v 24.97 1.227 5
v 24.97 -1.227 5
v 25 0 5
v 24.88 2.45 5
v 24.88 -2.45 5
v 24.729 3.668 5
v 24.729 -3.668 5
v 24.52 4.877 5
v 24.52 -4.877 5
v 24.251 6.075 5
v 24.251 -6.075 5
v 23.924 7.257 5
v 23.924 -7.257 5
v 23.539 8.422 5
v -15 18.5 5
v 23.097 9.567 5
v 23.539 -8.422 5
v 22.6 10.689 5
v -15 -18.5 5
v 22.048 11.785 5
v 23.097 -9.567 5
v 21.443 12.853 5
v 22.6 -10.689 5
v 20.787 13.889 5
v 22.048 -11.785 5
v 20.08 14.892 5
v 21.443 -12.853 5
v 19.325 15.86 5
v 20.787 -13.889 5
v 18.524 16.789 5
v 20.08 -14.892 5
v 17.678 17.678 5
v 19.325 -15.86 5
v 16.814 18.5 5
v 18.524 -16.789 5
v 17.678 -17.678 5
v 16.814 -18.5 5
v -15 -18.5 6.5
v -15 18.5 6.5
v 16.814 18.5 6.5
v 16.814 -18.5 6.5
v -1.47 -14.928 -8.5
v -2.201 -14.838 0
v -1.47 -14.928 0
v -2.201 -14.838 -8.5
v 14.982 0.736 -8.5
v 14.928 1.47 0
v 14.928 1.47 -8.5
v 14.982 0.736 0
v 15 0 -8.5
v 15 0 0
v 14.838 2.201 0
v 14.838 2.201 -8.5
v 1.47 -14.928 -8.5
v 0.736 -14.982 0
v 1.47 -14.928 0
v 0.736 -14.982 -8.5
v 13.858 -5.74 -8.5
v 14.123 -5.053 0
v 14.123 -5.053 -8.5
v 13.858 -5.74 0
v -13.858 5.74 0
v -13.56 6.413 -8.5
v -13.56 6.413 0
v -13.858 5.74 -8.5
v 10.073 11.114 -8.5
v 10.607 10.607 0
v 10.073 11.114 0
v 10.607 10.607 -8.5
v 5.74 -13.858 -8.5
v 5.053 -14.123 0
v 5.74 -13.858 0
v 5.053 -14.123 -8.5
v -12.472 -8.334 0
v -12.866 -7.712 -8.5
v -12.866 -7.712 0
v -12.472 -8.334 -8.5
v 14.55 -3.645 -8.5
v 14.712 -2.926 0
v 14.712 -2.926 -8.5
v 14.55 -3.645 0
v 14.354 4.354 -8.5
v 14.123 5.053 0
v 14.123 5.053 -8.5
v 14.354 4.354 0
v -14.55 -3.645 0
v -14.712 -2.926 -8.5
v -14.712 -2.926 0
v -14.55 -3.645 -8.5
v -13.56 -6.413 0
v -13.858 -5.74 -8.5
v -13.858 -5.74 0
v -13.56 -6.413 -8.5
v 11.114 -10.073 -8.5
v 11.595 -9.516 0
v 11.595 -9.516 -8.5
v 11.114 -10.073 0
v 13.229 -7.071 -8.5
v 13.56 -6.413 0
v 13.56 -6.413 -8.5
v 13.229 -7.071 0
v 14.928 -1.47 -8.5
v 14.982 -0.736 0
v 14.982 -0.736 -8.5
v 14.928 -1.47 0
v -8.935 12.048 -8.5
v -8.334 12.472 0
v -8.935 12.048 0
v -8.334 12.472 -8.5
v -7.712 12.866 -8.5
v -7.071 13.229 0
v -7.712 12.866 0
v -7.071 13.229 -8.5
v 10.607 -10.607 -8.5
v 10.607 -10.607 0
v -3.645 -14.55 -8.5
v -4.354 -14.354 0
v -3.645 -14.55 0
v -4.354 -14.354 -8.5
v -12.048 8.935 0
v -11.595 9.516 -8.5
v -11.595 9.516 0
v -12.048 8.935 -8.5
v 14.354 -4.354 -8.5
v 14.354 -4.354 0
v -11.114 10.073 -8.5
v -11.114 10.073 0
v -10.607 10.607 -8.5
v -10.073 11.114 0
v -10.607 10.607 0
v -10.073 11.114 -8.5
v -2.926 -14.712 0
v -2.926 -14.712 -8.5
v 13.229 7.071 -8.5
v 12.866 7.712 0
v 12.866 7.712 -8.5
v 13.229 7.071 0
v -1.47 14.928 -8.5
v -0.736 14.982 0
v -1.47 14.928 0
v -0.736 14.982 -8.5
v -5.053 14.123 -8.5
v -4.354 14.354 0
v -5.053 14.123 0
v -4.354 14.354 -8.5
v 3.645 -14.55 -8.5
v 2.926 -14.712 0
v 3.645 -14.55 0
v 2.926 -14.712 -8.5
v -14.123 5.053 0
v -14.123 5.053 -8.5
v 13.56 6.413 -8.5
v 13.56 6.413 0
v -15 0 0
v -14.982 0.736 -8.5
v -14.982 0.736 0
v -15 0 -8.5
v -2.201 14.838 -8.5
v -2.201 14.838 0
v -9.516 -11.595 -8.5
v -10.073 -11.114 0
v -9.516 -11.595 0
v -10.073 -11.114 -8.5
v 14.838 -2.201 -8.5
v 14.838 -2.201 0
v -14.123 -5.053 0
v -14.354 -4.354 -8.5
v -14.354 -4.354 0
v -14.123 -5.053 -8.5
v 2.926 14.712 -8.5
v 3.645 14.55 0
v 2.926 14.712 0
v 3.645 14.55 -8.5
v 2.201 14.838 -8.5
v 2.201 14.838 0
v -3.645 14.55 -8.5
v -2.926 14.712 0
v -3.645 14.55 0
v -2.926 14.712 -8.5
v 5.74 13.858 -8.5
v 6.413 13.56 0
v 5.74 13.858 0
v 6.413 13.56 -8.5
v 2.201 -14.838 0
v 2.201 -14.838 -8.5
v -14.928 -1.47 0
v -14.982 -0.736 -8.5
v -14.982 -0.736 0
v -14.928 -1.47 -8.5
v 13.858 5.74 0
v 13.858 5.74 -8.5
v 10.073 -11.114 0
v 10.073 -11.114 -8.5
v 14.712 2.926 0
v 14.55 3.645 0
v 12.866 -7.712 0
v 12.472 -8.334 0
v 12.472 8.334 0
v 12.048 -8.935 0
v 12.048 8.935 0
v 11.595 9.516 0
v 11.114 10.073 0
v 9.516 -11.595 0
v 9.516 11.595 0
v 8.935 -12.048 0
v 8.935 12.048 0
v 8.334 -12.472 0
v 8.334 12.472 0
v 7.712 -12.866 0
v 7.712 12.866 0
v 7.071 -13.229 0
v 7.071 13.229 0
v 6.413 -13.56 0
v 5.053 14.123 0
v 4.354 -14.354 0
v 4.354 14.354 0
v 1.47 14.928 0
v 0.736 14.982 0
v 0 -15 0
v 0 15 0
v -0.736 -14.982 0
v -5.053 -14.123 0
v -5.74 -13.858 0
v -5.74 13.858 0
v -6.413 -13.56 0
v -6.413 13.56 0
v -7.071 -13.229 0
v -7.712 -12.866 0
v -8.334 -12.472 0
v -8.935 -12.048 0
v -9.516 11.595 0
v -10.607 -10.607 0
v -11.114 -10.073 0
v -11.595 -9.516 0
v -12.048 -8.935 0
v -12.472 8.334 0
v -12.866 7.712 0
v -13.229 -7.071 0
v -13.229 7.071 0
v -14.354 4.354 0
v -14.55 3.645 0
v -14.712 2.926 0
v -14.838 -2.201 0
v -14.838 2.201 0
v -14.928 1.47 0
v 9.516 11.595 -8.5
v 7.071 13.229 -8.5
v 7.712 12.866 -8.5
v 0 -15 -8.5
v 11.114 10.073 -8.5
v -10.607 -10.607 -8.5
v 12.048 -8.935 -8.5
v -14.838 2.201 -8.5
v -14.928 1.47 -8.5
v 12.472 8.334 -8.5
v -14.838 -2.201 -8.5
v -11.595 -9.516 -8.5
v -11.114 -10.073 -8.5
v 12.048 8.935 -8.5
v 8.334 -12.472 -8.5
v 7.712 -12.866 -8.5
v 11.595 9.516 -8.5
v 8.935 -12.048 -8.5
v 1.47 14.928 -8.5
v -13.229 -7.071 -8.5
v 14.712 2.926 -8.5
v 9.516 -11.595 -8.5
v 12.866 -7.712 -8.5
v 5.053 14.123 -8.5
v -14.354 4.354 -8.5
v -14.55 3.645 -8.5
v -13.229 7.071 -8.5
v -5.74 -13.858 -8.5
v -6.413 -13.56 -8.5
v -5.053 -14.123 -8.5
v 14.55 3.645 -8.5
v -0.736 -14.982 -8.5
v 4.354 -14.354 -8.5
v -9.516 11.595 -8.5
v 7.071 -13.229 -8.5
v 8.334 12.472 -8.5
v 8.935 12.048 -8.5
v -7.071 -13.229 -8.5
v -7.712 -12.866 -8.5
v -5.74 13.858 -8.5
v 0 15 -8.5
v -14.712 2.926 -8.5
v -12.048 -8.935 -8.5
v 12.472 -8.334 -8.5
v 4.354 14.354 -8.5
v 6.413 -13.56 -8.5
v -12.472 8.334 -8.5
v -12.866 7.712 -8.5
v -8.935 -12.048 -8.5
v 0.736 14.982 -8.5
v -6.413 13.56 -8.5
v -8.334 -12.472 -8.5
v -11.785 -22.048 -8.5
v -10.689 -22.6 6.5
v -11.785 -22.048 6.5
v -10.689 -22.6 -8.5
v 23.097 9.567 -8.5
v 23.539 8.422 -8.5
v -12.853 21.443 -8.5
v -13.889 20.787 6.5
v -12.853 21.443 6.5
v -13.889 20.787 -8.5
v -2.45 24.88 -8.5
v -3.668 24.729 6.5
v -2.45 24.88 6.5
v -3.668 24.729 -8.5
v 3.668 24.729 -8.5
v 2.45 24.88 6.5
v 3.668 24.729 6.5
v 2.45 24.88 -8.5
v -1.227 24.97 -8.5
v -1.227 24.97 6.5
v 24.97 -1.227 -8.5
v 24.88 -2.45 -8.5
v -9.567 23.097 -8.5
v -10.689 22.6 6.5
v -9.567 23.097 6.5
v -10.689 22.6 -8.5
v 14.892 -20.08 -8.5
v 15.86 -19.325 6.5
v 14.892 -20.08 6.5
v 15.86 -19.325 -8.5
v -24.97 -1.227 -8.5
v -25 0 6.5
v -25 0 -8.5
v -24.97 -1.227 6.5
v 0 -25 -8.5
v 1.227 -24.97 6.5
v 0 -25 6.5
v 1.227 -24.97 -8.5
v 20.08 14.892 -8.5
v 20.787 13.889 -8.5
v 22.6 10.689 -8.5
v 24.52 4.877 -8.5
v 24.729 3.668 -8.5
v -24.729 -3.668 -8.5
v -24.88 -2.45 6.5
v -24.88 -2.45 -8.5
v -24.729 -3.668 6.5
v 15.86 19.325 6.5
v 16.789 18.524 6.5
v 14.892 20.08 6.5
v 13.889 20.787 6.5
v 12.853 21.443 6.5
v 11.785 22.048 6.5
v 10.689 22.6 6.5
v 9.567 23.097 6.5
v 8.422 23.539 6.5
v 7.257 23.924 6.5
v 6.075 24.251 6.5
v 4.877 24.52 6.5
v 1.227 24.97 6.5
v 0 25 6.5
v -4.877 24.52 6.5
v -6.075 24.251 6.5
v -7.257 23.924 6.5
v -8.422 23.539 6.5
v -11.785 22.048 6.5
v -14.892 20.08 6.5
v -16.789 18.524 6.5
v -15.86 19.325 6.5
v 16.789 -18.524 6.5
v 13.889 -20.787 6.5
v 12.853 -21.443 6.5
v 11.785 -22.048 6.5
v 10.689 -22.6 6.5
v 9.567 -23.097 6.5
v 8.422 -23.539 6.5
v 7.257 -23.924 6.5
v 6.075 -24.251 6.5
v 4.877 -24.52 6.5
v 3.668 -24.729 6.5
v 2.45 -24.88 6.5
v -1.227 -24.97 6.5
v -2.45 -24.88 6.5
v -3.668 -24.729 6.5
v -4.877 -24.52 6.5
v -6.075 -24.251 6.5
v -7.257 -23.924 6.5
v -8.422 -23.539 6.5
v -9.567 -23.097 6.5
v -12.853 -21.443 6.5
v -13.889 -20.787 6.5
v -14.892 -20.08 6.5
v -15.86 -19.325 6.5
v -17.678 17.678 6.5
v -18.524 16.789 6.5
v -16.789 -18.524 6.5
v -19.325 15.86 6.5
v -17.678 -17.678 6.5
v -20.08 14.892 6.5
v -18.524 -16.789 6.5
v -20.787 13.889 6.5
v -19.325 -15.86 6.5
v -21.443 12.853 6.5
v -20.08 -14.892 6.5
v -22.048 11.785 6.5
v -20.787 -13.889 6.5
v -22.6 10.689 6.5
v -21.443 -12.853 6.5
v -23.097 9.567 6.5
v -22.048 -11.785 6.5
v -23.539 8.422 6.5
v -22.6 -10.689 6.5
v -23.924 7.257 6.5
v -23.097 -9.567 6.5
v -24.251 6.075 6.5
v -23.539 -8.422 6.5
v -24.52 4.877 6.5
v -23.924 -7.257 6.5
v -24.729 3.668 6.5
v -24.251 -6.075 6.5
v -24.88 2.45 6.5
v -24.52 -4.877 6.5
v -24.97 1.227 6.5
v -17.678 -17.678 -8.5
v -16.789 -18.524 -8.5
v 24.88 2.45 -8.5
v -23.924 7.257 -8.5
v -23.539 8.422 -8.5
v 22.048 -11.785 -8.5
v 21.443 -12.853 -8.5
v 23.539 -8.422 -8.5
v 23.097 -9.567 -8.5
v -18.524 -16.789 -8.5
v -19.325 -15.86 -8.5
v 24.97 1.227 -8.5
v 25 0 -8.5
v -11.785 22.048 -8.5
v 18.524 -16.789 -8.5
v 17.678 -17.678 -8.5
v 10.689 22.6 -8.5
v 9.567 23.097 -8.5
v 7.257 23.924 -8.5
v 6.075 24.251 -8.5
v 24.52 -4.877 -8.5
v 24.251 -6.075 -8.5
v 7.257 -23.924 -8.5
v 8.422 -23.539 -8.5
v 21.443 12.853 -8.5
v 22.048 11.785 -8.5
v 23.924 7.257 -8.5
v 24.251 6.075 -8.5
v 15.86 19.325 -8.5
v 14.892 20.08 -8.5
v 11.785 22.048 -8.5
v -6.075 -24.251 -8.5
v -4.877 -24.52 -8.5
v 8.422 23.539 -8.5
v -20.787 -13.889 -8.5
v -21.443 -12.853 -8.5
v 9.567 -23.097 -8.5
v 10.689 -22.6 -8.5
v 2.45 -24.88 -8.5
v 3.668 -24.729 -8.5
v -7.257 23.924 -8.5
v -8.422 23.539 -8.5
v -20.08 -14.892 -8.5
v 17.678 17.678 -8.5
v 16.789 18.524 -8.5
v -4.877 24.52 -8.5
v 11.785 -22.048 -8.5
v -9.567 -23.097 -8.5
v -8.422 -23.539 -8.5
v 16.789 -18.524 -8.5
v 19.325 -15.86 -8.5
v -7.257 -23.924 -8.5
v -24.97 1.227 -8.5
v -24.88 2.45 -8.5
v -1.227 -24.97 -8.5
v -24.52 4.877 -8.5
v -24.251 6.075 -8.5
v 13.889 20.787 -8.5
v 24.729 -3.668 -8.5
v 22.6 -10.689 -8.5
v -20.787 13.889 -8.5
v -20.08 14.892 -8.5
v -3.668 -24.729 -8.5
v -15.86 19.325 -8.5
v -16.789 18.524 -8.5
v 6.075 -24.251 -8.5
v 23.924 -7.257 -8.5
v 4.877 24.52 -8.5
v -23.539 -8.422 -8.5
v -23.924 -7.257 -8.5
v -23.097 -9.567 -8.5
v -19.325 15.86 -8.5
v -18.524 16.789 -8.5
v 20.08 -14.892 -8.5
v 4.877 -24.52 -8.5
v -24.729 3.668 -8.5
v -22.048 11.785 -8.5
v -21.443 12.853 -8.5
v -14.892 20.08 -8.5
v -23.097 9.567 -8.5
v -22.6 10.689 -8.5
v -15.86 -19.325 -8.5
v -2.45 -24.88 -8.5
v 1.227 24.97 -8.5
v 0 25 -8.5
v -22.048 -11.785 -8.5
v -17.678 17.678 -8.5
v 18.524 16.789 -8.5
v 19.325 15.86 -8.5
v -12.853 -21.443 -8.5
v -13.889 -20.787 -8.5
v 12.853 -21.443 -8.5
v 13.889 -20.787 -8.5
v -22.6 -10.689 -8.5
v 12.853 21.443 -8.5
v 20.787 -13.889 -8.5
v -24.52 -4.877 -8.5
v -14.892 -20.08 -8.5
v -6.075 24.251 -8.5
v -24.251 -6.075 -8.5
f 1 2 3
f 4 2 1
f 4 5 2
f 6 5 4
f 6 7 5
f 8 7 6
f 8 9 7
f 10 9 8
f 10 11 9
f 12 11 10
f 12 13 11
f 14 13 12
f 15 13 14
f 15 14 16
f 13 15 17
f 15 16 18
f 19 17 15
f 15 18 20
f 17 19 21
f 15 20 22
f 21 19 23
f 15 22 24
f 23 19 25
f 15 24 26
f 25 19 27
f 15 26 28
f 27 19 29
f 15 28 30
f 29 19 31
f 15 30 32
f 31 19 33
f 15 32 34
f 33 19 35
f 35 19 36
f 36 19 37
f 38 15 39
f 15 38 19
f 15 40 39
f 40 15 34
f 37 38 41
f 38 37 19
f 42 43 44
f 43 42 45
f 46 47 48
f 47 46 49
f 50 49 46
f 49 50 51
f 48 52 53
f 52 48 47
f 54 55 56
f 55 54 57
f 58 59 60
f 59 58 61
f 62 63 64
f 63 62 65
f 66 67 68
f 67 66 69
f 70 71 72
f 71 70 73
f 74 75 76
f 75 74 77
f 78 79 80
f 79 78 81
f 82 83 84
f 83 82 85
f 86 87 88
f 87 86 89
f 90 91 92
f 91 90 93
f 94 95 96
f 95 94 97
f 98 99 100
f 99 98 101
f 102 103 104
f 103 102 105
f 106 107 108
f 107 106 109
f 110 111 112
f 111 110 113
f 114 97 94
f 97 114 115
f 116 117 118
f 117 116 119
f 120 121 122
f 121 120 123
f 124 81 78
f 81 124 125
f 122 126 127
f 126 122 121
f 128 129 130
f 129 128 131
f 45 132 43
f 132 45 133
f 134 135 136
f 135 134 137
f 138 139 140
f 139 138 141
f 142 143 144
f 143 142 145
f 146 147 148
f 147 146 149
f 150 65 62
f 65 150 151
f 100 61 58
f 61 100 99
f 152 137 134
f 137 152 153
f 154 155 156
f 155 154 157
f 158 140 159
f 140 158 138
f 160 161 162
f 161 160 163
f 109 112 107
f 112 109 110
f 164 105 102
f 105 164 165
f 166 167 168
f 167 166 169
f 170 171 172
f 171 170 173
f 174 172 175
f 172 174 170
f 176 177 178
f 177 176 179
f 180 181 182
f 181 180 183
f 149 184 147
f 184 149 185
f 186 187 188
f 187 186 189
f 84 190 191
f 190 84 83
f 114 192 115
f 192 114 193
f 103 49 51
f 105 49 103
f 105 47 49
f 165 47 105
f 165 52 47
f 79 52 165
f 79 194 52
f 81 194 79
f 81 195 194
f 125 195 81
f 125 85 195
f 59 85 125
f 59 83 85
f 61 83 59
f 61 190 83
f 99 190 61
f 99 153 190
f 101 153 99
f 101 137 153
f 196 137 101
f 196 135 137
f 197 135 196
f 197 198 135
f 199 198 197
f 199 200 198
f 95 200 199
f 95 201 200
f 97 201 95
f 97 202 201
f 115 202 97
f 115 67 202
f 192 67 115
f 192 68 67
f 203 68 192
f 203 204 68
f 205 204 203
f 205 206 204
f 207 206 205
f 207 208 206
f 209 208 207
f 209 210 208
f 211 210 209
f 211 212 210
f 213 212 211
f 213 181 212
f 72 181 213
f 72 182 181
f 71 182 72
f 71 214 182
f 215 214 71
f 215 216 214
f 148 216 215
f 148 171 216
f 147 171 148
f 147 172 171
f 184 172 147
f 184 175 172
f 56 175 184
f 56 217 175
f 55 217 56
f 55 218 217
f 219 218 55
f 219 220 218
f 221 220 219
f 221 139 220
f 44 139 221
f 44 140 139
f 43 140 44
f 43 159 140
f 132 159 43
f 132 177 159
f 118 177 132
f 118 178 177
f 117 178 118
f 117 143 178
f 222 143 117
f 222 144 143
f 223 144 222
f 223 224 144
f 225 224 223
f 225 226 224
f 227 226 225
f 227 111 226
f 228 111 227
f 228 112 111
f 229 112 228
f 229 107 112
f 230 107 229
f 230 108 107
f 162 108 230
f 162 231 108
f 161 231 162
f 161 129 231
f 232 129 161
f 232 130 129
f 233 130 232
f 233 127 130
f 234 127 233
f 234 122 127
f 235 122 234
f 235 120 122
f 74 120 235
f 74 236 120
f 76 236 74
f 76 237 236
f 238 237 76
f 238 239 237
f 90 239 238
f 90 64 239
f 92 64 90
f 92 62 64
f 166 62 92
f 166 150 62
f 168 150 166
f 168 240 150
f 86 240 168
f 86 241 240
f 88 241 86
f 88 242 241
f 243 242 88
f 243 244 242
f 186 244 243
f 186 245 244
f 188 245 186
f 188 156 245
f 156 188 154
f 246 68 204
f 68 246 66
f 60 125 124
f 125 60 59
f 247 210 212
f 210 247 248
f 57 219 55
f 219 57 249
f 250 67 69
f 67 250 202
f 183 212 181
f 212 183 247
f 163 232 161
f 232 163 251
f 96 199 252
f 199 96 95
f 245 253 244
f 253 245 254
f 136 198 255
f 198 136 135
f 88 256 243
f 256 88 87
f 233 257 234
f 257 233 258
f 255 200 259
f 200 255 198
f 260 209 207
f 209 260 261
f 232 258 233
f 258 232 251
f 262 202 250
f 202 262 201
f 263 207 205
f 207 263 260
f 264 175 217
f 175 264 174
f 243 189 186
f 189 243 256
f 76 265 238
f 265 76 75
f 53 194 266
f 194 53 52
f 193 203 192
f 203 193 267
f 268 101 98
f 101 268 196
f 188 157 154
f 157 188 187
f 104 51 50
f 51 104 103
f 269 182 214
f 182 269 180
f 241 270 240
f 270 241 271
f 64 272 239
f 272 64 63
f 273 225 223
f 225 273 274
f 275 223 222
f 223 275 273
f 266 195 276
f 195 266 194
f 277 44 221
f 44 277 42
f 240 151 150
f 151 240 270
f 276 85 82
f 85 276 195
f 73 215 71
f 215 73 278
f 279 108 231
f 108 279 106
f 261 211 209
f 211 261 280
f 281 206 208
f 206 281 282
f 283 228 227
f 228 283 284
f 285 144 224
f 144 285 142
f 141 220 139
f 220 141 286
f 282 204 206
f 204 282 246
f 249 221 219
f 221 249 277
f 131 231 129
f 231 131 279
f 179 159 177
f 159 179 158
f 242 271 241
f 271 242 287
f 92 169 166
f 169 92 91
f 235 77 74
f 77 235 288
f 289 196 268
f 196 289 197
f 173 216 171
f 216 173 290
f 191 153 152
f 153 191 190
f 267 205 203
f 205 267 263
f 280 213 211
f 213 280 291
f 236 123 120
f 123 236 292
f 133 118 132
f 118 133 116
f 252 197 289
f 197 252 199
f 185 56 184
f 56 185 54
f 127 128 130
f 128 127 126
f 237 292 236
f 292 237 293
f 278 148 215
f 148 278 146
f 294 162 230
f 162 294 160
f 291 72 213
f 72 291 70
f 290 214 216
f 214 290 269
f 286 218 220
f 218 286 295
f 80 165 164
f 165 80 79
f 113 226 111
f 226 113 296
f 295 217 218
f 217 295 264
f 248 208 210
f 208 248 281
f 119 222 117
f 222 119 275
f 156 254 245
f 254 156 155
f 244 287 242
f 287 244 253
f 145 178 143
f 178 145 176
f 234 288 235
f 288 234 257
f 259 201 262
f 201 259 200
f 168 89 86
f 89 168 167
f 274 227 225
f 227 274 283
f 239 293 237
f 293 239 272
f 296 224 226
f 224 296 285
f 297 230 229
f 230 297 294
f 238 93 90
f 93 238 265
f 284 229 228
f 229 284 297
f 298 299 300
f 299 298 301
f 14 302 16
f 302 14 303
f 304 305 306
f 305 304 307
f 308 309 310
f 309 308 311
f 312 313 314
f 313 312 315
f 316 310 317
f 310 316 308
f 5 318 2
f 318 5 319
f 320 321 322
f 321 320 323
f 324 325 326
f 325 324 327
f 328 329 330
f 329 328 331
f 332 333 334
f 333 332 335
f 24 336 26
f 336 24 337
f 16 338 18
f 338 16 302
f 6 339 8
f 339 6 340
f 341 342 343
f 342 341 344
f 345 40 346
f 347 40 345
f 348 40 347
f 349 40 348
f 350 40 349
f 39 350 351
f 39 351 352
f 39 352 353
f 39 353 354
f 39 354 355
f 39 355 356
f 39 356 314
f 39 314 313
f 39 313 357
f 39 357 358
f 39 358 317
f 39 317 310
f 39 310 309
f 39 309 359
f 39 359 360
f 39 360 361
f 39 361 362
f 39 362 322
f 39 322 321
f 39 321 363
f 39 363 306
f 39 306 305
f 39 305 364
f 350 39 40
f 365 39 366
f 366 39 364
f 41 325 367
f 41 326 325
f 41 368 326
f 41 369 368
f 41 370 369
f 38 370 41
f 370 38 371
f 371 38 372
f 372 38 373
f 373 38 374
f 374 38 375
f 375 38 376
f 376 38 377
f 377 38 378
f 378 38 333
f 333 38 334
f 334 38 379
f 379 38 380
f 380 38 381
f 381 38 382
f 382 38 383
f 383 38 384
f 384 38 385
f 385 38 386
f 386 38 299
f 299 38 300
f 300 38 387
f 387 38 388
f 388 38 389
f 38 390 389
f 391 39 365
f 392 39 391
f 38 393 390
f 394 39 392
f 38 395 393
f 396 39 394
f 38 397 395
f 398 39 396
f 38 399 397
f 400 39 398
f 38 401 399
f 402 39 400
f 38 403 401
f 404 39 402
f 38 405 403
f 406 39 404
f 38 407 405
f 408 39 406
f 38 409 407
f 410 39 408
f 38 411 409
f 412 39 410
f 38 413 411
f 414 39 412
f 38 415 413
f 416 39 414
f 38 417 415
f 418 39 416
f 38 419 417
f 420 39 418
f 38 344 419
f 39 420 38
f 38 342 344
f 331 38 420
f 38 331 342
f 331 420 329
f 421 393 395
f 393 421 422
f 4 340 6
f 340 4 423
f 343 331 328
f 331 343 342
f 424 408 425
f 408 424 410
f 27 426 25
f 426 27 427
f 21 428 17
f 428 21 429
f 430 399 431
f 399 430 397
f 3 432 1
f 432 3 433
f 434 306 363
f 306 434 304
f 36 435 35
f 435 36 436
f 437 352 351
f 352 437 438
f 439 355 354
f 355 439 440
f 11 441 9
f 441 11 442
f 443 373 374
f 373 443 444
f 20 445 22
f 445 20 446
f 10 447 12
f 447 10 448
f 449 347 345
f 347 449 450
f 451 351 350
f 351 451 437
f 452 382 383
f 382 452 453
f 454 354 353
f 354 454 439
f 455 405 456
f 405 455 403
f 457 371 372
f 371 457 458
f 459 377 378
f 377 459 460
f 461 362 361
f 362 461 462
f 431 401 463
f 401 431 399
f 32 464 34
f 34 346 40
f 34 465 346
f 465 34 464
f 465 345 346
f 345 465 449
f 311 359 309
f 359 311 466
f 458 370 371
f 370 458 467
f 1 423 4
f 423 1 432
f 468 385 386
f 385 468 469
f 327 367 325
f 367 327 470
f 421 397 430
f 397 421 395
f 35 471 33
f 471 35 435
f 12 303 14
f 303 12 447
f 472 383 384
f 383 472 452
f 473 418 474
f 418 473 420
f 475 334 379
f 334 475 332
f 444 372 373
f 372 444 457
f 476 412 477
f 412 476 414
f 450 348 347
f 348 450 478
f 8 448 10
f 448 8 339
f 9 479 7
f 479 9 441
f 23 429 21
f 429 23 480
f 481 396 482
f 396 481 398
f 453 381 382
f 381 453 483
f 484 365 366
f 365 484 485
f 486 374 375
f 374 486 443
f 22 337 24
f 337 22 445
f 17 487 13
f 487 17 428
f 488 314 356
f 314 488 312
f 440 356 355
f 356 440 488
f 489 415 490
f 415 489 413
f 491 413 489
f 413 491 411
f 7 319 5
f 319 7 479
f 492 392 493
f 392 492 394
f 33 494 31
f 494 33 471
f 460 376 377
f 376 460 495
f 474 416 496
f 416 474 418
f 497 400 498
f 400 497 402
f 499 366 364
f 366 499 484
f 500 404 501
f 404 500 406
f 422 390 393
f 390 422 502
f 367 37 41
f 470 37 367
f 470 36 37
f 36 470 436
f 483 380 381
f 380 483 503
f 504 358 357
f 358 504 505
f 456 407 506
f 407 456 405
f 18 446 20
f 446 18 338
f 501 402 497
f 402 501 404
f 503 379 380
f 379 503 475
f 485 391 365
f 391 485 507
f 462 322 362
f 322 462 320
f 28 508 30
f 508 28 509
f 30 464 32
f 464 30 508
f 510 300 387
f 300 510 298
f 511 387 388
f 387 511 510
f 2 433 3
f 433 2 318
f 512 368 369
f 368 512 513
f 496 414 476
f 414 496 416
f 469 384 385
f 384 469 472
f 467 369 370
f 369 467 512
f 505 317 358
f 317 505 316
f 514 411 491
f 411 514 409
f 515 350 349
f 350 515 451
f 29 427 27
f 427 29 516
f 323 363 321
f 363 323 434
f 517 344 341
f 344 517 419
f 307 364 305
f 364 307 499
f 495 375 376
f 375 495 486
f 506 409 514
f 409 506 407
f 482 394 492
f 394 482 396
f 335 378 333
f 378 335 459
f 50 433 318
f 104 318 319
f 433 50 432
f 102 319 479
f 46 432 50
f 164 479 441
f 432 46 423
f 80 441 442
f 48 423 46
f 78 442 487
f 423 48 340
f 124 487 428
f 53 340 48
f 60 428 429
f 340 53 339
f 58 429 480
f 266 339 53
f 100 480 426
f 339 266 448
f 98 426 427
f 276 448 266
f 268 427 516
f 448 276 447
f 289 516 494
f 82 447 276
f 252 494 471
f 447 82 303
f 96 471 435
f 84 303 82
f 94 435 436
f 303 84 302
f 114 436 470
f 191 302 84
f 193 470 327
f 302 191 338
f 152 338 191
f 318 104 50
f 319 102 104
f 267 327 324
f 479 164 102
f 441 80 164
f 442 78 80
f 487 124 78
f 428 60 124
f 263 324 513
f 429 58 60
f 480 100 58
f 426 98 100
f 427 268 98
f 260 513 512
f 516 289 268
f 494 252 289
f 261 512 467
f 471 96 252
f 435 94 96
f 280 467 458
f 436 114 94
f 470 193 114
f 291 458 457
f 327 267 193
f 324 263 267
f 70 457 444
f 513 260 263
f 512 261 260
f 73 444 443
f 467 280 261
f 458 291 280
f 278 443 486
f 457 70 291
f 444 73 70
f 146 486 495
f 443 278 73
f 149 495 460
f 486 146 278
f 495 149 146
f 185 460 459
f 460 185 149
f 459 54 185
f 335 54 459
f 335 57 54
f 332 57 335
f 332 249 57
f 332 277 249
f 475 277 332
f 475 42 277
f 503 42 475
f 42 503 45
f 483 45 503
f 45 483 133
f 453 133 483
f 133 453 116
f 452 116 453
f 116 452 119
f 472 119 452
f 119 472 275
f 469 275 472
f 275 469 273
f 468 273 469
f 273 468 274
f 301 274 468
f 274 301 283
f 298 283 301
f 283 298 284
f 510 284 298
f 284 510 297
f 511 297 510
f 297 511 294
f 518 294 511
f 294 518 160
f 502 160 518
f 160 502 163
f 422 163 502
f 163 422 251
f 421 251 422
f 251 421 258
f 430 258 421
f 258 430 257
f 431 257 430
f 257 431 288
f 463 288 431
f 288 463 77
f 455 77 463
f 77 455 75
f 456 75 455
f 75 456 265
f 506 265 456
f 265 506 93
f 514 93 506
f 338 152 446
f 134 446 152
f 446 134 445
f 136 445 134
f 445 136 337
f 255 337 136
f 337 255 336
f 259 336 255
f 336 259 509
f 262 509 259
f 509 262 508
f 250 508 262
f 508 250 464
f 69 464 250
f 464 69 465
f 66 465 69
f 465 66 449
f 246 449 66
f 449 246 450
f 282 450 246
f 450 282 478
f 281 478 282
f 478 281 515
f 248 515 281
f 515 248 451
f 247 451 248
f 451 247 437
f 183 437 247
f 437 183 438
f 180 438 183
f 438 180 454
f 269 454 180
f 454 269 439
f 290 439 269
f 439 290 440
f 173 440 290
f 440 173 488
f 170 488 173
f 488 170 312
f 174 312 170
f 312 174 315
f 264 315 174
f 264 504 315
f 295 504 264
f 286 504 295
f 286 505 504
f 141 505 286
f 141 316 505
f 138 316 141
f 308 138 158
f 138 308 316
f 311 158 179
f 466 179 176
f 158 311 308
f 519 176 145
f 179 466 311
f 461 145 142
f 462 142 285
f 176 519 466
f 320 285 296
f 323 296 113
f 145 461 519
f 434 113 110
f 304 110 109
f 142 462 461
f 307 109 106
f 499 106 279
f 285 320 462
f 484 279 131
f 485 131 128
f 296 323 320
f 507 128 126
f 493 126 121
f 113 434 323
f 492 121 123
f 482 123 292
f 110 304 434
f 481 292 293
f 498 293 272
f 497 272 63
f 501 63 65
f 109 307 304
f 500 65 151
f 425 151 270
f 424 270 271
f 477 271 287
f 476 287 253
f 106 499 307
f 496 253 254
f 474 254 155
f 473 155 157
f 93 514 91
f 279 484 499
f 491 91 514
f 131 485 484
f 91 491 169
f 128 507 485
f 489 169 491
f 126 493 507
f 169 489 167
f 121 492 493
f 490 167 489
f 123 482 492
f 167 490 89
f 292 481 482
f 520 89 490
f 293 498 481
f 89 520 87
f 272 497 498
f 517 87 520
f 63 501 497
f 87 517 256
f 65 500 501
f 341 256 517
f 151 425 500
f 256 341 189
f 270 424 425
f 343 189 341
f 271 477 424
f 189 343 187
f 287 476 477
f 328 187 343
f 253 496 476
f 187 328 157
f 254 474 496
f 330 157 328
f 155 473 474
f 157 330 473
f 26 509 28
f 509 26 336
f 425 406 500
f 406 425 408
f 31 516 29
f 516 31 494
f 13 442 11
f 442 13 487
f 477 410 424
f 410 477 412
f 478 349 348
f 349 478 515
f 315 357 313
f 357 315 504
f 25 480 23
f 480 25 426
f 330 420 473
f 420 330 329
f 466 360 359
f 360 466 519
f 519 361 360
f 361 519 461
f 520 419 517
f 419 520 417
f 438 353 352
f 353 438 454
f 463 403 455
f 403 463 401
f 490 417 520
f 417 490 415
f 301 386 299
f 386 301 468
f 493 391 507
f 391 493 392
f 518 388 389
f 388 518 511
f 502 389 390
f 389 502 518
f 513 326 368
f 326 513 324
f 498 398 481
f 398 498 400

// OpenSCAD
$fn = 128;


difference() {
			// 6.5mm above Zero pane, 8.5 below 
			// 5.0mm between board and bearing
			// 1.5mm to fit the board into
			translate([0,0,-1]) cylinder(r=25, h=15, center=true);
	union() {
		translate([0,0,3]) linear_extrude(file="cut-out.dxf", 
                                            layer="umriss", 
                                            height=6,
                                            center=true);

		translate([5,0,5+2]) cube(size=[40,37,4], center=true);
		
		translate([0,0,-1]) linear_extrude(file="cut-out.dxf",
                                            layer="holes",
                                            height=16,
                                            center=true);

		translate([0,0,-4.5]) cylinder(r=15, h=9, center=true);

		

	}
}	
